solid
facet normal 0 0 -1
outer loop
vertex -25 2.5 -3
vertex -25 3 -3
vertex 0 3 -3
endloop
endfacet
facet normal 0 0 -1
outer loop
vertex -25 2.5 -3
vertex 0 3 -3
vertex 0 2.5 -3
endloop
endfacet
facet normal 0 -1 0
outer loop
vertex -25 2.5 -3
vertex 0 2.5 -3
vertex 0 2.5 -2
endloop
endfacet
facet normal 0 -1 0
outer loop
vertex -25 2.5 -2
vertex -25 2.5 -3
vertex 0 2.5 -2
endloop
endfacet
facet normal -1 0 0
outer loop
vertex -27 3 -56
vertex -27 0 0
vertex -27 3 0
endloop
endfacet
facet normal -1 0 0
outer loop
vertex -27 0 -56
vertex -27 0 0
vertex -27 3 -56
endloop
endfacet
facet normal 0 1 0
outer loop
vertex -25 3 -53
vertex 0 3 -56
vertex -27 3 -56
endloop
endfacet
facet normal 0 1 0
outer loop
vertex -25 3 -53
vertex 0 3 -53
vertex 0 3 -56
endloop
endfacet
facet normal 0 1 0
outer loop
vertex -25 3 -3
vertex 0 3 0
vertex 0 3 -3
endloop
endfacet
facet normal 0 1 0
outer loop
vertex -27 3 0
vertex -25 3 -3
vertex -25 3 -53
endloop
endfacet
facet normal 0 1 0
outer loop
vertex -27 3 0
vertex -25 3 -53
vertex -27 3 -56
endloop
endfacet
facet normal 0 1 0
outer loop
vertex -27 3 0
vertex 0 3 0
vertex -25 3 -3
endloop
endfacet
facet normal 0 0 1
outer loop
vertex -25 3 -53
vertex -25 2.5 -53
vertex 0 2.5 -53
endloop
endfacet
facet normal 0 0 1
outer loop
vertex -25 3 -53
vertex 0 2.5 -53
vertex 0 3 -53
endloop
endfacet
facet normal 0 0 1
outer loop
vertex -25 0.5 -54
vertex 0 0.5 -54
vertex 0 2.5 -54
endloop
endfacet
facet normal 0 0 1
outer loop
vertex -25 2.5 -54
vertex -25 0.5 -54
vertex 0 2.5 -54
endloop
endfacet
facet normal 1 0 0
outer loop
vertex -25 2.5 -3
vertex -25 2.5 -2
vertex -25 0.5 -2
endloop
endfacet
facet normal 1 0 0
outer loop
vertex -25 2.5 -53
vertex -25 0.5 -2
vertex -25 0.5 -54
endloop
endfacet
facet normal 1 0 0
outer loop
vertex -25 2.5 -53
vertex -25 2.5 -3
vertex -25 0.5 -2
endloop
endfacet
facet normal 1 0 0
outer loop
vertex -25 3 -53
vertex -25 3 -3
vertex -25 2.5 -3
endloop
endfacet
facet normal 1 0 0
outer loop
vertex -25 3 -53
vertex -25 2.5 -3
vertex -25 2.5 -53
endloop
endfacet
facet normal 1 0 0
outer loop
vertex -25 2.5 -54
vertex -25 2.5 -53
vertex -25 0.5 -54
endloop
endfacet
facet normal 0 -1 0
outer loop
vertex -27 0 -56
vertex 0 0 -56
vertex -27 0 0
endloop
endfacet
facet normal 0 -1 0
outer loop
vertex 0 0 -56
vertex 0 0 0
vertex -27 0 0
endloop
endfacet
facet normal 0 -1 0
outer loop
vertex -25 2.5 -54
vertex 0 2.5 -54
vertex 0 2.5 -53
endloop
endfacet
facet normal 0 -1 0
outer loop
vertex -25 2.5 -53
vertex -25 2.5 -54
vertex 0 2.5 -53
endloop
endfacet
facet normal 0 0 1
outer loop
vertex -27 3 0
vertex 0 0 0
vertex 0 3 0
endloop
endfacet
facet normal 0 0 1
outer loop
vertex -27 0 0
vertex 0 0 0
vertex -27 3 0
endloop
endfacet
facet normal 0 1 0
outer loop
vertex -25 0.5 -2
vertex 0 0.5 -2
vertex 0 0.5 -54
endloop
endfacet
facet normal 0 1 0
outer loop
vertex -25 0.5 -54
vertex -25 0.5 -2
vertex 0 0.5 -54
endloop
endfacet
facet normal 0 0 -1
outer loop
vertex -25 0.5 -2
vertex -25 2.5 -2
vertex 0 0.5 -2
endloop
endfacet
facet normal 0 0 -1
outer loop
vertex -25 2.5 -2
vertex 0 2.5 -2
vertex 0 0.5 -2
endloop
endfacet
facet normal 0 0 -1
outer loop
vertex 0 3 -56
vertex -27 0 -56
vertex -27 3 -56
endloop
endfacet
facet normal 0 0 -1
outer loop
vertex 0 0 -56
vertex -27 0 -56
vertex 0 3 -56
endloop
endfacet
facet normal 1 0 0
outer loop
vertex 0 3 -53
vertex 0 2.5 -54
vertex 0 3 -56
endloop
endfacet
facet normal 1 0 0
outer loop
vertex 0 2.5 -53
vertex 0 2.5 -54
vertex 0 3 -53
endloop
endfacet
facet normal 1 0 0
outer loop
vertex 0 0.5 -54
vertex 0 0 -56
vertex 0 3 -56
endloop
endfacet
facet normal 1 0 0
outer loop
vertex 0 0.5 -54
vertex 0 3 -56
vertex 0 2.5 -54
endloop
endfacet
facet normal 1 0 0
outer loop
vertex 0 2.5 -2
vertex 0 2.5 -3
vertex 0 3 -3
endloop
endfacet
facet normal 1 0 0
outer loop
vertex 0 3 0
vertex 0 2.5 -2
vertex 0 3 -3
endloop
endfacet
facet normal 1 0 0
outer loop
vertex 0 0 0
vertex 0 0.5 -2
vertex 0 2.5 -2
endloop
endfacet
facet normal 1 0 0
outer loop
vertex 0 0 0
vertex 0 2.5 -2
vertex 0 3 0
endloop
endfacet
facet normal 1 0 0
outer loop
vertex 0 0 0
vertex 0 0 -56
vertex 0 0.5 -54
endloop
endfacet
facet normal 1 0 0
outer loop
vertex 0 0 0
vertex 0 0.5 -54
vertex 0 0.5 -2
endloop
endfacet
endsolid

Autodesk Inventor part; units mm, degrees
ref_plane "YZ Plane" through (0, 0, 0) normal (1, 0, 0) x (0, 1, 0)
ref_plane "XZ Plane" through (0, 0, 0) normal (0, 1, 0) x (-1, 0, 0)
ref_plane "XY Plane" through (0, 0, 0) normal (0, 0, 1) x (1, 0, 0)
sketch "草图1" plane through (0, 0, 0) normal (0, 1, 0) x (-1, 0, 0)
  line L0 (0, 0) -> (27, 0)
  line L1 (27, 0) -> (27, -56)
  line L2 (27, -56) -> (0, -56)
  line L3 (0, -56) -> (0, 0)
  dimension "d0" = 27
  dimension "d1" = 56
extrude "拉伸1" add sketch "草图1" along normal blind 3
sketch "草图2" plane through (0, 0, 0) normal (1, 0, 0) x (0, 0, -1)
  line L0 (56, 3) -> (0, 3) projected
  line L1 (28, 3) -> (28, -4.4631)
  line L2 (19.0299, 3) -> (19.0299, 2.5)
  line L3 (28, 2.5) -> (2, 2.5)
  line L4 (2, 2.5) -> (2, 0.5)
  line L5 (2, 0.5) -> (28, 0.5)
  line L6 (28, 0.5) -> (28, 2.5)
  point P0 (0, 0)
  dimension "d4" = 0.5
  dimension "d5" = 26
  dimension "d6" = 2
extrude "拉伸2" cut sketch "草图2" against normal blind 25 contours L1 L5 L4 L3
mirror "镜像1" about plane through (0, 2.5, -28) normal (0, 0, 1) of "拉伸2"
sketch "草图3" plane through (0, 0, 0) normal (1, 0, 0) x (0, 0, -1)
  point P0 (0, 0)
sketch "草图4" plane through (0, 0, 0) normal (1, 0, 0) x (0, 0, -1)
  line L0 (56, 3) -> (0, 3) projected
  line L1 (28, 3) -> (28, -1.1507)
  line L2 (28, 3) -> (3, 3)
  line L3 (3, 3) -> (3, 2.5)
  line L4 (54, 2.5) -> (2, 2.5) projected
  line L5 (0, 0) -> (56, 0) projected
  line L6 (56, 0) -> (56, 3) projected
  line L7 (0, 3) -> (56, 3) projected
  line L8 (0, 0) -> (0, 3) projected
  line L9 (2, 2.5) -> (54, 2.5) projected
  line L10 (54, 2.5) -> (54, 0.5) projected
  line L11 (54, 0.5) -> (2, 0.5) projected
  line L12 (2, 0.5) -> (2, 2.5) projected
  point P0 (28, 2.5)
  dimension "d9" = 25
extrude "拉伸3" cut sketch "草图4" against normal blind 25 contours L1 L4 L3 L0
mirror "镜像2" about plane through (0, 3, -28) normal (0, 0, 1) of "拉伸3"
